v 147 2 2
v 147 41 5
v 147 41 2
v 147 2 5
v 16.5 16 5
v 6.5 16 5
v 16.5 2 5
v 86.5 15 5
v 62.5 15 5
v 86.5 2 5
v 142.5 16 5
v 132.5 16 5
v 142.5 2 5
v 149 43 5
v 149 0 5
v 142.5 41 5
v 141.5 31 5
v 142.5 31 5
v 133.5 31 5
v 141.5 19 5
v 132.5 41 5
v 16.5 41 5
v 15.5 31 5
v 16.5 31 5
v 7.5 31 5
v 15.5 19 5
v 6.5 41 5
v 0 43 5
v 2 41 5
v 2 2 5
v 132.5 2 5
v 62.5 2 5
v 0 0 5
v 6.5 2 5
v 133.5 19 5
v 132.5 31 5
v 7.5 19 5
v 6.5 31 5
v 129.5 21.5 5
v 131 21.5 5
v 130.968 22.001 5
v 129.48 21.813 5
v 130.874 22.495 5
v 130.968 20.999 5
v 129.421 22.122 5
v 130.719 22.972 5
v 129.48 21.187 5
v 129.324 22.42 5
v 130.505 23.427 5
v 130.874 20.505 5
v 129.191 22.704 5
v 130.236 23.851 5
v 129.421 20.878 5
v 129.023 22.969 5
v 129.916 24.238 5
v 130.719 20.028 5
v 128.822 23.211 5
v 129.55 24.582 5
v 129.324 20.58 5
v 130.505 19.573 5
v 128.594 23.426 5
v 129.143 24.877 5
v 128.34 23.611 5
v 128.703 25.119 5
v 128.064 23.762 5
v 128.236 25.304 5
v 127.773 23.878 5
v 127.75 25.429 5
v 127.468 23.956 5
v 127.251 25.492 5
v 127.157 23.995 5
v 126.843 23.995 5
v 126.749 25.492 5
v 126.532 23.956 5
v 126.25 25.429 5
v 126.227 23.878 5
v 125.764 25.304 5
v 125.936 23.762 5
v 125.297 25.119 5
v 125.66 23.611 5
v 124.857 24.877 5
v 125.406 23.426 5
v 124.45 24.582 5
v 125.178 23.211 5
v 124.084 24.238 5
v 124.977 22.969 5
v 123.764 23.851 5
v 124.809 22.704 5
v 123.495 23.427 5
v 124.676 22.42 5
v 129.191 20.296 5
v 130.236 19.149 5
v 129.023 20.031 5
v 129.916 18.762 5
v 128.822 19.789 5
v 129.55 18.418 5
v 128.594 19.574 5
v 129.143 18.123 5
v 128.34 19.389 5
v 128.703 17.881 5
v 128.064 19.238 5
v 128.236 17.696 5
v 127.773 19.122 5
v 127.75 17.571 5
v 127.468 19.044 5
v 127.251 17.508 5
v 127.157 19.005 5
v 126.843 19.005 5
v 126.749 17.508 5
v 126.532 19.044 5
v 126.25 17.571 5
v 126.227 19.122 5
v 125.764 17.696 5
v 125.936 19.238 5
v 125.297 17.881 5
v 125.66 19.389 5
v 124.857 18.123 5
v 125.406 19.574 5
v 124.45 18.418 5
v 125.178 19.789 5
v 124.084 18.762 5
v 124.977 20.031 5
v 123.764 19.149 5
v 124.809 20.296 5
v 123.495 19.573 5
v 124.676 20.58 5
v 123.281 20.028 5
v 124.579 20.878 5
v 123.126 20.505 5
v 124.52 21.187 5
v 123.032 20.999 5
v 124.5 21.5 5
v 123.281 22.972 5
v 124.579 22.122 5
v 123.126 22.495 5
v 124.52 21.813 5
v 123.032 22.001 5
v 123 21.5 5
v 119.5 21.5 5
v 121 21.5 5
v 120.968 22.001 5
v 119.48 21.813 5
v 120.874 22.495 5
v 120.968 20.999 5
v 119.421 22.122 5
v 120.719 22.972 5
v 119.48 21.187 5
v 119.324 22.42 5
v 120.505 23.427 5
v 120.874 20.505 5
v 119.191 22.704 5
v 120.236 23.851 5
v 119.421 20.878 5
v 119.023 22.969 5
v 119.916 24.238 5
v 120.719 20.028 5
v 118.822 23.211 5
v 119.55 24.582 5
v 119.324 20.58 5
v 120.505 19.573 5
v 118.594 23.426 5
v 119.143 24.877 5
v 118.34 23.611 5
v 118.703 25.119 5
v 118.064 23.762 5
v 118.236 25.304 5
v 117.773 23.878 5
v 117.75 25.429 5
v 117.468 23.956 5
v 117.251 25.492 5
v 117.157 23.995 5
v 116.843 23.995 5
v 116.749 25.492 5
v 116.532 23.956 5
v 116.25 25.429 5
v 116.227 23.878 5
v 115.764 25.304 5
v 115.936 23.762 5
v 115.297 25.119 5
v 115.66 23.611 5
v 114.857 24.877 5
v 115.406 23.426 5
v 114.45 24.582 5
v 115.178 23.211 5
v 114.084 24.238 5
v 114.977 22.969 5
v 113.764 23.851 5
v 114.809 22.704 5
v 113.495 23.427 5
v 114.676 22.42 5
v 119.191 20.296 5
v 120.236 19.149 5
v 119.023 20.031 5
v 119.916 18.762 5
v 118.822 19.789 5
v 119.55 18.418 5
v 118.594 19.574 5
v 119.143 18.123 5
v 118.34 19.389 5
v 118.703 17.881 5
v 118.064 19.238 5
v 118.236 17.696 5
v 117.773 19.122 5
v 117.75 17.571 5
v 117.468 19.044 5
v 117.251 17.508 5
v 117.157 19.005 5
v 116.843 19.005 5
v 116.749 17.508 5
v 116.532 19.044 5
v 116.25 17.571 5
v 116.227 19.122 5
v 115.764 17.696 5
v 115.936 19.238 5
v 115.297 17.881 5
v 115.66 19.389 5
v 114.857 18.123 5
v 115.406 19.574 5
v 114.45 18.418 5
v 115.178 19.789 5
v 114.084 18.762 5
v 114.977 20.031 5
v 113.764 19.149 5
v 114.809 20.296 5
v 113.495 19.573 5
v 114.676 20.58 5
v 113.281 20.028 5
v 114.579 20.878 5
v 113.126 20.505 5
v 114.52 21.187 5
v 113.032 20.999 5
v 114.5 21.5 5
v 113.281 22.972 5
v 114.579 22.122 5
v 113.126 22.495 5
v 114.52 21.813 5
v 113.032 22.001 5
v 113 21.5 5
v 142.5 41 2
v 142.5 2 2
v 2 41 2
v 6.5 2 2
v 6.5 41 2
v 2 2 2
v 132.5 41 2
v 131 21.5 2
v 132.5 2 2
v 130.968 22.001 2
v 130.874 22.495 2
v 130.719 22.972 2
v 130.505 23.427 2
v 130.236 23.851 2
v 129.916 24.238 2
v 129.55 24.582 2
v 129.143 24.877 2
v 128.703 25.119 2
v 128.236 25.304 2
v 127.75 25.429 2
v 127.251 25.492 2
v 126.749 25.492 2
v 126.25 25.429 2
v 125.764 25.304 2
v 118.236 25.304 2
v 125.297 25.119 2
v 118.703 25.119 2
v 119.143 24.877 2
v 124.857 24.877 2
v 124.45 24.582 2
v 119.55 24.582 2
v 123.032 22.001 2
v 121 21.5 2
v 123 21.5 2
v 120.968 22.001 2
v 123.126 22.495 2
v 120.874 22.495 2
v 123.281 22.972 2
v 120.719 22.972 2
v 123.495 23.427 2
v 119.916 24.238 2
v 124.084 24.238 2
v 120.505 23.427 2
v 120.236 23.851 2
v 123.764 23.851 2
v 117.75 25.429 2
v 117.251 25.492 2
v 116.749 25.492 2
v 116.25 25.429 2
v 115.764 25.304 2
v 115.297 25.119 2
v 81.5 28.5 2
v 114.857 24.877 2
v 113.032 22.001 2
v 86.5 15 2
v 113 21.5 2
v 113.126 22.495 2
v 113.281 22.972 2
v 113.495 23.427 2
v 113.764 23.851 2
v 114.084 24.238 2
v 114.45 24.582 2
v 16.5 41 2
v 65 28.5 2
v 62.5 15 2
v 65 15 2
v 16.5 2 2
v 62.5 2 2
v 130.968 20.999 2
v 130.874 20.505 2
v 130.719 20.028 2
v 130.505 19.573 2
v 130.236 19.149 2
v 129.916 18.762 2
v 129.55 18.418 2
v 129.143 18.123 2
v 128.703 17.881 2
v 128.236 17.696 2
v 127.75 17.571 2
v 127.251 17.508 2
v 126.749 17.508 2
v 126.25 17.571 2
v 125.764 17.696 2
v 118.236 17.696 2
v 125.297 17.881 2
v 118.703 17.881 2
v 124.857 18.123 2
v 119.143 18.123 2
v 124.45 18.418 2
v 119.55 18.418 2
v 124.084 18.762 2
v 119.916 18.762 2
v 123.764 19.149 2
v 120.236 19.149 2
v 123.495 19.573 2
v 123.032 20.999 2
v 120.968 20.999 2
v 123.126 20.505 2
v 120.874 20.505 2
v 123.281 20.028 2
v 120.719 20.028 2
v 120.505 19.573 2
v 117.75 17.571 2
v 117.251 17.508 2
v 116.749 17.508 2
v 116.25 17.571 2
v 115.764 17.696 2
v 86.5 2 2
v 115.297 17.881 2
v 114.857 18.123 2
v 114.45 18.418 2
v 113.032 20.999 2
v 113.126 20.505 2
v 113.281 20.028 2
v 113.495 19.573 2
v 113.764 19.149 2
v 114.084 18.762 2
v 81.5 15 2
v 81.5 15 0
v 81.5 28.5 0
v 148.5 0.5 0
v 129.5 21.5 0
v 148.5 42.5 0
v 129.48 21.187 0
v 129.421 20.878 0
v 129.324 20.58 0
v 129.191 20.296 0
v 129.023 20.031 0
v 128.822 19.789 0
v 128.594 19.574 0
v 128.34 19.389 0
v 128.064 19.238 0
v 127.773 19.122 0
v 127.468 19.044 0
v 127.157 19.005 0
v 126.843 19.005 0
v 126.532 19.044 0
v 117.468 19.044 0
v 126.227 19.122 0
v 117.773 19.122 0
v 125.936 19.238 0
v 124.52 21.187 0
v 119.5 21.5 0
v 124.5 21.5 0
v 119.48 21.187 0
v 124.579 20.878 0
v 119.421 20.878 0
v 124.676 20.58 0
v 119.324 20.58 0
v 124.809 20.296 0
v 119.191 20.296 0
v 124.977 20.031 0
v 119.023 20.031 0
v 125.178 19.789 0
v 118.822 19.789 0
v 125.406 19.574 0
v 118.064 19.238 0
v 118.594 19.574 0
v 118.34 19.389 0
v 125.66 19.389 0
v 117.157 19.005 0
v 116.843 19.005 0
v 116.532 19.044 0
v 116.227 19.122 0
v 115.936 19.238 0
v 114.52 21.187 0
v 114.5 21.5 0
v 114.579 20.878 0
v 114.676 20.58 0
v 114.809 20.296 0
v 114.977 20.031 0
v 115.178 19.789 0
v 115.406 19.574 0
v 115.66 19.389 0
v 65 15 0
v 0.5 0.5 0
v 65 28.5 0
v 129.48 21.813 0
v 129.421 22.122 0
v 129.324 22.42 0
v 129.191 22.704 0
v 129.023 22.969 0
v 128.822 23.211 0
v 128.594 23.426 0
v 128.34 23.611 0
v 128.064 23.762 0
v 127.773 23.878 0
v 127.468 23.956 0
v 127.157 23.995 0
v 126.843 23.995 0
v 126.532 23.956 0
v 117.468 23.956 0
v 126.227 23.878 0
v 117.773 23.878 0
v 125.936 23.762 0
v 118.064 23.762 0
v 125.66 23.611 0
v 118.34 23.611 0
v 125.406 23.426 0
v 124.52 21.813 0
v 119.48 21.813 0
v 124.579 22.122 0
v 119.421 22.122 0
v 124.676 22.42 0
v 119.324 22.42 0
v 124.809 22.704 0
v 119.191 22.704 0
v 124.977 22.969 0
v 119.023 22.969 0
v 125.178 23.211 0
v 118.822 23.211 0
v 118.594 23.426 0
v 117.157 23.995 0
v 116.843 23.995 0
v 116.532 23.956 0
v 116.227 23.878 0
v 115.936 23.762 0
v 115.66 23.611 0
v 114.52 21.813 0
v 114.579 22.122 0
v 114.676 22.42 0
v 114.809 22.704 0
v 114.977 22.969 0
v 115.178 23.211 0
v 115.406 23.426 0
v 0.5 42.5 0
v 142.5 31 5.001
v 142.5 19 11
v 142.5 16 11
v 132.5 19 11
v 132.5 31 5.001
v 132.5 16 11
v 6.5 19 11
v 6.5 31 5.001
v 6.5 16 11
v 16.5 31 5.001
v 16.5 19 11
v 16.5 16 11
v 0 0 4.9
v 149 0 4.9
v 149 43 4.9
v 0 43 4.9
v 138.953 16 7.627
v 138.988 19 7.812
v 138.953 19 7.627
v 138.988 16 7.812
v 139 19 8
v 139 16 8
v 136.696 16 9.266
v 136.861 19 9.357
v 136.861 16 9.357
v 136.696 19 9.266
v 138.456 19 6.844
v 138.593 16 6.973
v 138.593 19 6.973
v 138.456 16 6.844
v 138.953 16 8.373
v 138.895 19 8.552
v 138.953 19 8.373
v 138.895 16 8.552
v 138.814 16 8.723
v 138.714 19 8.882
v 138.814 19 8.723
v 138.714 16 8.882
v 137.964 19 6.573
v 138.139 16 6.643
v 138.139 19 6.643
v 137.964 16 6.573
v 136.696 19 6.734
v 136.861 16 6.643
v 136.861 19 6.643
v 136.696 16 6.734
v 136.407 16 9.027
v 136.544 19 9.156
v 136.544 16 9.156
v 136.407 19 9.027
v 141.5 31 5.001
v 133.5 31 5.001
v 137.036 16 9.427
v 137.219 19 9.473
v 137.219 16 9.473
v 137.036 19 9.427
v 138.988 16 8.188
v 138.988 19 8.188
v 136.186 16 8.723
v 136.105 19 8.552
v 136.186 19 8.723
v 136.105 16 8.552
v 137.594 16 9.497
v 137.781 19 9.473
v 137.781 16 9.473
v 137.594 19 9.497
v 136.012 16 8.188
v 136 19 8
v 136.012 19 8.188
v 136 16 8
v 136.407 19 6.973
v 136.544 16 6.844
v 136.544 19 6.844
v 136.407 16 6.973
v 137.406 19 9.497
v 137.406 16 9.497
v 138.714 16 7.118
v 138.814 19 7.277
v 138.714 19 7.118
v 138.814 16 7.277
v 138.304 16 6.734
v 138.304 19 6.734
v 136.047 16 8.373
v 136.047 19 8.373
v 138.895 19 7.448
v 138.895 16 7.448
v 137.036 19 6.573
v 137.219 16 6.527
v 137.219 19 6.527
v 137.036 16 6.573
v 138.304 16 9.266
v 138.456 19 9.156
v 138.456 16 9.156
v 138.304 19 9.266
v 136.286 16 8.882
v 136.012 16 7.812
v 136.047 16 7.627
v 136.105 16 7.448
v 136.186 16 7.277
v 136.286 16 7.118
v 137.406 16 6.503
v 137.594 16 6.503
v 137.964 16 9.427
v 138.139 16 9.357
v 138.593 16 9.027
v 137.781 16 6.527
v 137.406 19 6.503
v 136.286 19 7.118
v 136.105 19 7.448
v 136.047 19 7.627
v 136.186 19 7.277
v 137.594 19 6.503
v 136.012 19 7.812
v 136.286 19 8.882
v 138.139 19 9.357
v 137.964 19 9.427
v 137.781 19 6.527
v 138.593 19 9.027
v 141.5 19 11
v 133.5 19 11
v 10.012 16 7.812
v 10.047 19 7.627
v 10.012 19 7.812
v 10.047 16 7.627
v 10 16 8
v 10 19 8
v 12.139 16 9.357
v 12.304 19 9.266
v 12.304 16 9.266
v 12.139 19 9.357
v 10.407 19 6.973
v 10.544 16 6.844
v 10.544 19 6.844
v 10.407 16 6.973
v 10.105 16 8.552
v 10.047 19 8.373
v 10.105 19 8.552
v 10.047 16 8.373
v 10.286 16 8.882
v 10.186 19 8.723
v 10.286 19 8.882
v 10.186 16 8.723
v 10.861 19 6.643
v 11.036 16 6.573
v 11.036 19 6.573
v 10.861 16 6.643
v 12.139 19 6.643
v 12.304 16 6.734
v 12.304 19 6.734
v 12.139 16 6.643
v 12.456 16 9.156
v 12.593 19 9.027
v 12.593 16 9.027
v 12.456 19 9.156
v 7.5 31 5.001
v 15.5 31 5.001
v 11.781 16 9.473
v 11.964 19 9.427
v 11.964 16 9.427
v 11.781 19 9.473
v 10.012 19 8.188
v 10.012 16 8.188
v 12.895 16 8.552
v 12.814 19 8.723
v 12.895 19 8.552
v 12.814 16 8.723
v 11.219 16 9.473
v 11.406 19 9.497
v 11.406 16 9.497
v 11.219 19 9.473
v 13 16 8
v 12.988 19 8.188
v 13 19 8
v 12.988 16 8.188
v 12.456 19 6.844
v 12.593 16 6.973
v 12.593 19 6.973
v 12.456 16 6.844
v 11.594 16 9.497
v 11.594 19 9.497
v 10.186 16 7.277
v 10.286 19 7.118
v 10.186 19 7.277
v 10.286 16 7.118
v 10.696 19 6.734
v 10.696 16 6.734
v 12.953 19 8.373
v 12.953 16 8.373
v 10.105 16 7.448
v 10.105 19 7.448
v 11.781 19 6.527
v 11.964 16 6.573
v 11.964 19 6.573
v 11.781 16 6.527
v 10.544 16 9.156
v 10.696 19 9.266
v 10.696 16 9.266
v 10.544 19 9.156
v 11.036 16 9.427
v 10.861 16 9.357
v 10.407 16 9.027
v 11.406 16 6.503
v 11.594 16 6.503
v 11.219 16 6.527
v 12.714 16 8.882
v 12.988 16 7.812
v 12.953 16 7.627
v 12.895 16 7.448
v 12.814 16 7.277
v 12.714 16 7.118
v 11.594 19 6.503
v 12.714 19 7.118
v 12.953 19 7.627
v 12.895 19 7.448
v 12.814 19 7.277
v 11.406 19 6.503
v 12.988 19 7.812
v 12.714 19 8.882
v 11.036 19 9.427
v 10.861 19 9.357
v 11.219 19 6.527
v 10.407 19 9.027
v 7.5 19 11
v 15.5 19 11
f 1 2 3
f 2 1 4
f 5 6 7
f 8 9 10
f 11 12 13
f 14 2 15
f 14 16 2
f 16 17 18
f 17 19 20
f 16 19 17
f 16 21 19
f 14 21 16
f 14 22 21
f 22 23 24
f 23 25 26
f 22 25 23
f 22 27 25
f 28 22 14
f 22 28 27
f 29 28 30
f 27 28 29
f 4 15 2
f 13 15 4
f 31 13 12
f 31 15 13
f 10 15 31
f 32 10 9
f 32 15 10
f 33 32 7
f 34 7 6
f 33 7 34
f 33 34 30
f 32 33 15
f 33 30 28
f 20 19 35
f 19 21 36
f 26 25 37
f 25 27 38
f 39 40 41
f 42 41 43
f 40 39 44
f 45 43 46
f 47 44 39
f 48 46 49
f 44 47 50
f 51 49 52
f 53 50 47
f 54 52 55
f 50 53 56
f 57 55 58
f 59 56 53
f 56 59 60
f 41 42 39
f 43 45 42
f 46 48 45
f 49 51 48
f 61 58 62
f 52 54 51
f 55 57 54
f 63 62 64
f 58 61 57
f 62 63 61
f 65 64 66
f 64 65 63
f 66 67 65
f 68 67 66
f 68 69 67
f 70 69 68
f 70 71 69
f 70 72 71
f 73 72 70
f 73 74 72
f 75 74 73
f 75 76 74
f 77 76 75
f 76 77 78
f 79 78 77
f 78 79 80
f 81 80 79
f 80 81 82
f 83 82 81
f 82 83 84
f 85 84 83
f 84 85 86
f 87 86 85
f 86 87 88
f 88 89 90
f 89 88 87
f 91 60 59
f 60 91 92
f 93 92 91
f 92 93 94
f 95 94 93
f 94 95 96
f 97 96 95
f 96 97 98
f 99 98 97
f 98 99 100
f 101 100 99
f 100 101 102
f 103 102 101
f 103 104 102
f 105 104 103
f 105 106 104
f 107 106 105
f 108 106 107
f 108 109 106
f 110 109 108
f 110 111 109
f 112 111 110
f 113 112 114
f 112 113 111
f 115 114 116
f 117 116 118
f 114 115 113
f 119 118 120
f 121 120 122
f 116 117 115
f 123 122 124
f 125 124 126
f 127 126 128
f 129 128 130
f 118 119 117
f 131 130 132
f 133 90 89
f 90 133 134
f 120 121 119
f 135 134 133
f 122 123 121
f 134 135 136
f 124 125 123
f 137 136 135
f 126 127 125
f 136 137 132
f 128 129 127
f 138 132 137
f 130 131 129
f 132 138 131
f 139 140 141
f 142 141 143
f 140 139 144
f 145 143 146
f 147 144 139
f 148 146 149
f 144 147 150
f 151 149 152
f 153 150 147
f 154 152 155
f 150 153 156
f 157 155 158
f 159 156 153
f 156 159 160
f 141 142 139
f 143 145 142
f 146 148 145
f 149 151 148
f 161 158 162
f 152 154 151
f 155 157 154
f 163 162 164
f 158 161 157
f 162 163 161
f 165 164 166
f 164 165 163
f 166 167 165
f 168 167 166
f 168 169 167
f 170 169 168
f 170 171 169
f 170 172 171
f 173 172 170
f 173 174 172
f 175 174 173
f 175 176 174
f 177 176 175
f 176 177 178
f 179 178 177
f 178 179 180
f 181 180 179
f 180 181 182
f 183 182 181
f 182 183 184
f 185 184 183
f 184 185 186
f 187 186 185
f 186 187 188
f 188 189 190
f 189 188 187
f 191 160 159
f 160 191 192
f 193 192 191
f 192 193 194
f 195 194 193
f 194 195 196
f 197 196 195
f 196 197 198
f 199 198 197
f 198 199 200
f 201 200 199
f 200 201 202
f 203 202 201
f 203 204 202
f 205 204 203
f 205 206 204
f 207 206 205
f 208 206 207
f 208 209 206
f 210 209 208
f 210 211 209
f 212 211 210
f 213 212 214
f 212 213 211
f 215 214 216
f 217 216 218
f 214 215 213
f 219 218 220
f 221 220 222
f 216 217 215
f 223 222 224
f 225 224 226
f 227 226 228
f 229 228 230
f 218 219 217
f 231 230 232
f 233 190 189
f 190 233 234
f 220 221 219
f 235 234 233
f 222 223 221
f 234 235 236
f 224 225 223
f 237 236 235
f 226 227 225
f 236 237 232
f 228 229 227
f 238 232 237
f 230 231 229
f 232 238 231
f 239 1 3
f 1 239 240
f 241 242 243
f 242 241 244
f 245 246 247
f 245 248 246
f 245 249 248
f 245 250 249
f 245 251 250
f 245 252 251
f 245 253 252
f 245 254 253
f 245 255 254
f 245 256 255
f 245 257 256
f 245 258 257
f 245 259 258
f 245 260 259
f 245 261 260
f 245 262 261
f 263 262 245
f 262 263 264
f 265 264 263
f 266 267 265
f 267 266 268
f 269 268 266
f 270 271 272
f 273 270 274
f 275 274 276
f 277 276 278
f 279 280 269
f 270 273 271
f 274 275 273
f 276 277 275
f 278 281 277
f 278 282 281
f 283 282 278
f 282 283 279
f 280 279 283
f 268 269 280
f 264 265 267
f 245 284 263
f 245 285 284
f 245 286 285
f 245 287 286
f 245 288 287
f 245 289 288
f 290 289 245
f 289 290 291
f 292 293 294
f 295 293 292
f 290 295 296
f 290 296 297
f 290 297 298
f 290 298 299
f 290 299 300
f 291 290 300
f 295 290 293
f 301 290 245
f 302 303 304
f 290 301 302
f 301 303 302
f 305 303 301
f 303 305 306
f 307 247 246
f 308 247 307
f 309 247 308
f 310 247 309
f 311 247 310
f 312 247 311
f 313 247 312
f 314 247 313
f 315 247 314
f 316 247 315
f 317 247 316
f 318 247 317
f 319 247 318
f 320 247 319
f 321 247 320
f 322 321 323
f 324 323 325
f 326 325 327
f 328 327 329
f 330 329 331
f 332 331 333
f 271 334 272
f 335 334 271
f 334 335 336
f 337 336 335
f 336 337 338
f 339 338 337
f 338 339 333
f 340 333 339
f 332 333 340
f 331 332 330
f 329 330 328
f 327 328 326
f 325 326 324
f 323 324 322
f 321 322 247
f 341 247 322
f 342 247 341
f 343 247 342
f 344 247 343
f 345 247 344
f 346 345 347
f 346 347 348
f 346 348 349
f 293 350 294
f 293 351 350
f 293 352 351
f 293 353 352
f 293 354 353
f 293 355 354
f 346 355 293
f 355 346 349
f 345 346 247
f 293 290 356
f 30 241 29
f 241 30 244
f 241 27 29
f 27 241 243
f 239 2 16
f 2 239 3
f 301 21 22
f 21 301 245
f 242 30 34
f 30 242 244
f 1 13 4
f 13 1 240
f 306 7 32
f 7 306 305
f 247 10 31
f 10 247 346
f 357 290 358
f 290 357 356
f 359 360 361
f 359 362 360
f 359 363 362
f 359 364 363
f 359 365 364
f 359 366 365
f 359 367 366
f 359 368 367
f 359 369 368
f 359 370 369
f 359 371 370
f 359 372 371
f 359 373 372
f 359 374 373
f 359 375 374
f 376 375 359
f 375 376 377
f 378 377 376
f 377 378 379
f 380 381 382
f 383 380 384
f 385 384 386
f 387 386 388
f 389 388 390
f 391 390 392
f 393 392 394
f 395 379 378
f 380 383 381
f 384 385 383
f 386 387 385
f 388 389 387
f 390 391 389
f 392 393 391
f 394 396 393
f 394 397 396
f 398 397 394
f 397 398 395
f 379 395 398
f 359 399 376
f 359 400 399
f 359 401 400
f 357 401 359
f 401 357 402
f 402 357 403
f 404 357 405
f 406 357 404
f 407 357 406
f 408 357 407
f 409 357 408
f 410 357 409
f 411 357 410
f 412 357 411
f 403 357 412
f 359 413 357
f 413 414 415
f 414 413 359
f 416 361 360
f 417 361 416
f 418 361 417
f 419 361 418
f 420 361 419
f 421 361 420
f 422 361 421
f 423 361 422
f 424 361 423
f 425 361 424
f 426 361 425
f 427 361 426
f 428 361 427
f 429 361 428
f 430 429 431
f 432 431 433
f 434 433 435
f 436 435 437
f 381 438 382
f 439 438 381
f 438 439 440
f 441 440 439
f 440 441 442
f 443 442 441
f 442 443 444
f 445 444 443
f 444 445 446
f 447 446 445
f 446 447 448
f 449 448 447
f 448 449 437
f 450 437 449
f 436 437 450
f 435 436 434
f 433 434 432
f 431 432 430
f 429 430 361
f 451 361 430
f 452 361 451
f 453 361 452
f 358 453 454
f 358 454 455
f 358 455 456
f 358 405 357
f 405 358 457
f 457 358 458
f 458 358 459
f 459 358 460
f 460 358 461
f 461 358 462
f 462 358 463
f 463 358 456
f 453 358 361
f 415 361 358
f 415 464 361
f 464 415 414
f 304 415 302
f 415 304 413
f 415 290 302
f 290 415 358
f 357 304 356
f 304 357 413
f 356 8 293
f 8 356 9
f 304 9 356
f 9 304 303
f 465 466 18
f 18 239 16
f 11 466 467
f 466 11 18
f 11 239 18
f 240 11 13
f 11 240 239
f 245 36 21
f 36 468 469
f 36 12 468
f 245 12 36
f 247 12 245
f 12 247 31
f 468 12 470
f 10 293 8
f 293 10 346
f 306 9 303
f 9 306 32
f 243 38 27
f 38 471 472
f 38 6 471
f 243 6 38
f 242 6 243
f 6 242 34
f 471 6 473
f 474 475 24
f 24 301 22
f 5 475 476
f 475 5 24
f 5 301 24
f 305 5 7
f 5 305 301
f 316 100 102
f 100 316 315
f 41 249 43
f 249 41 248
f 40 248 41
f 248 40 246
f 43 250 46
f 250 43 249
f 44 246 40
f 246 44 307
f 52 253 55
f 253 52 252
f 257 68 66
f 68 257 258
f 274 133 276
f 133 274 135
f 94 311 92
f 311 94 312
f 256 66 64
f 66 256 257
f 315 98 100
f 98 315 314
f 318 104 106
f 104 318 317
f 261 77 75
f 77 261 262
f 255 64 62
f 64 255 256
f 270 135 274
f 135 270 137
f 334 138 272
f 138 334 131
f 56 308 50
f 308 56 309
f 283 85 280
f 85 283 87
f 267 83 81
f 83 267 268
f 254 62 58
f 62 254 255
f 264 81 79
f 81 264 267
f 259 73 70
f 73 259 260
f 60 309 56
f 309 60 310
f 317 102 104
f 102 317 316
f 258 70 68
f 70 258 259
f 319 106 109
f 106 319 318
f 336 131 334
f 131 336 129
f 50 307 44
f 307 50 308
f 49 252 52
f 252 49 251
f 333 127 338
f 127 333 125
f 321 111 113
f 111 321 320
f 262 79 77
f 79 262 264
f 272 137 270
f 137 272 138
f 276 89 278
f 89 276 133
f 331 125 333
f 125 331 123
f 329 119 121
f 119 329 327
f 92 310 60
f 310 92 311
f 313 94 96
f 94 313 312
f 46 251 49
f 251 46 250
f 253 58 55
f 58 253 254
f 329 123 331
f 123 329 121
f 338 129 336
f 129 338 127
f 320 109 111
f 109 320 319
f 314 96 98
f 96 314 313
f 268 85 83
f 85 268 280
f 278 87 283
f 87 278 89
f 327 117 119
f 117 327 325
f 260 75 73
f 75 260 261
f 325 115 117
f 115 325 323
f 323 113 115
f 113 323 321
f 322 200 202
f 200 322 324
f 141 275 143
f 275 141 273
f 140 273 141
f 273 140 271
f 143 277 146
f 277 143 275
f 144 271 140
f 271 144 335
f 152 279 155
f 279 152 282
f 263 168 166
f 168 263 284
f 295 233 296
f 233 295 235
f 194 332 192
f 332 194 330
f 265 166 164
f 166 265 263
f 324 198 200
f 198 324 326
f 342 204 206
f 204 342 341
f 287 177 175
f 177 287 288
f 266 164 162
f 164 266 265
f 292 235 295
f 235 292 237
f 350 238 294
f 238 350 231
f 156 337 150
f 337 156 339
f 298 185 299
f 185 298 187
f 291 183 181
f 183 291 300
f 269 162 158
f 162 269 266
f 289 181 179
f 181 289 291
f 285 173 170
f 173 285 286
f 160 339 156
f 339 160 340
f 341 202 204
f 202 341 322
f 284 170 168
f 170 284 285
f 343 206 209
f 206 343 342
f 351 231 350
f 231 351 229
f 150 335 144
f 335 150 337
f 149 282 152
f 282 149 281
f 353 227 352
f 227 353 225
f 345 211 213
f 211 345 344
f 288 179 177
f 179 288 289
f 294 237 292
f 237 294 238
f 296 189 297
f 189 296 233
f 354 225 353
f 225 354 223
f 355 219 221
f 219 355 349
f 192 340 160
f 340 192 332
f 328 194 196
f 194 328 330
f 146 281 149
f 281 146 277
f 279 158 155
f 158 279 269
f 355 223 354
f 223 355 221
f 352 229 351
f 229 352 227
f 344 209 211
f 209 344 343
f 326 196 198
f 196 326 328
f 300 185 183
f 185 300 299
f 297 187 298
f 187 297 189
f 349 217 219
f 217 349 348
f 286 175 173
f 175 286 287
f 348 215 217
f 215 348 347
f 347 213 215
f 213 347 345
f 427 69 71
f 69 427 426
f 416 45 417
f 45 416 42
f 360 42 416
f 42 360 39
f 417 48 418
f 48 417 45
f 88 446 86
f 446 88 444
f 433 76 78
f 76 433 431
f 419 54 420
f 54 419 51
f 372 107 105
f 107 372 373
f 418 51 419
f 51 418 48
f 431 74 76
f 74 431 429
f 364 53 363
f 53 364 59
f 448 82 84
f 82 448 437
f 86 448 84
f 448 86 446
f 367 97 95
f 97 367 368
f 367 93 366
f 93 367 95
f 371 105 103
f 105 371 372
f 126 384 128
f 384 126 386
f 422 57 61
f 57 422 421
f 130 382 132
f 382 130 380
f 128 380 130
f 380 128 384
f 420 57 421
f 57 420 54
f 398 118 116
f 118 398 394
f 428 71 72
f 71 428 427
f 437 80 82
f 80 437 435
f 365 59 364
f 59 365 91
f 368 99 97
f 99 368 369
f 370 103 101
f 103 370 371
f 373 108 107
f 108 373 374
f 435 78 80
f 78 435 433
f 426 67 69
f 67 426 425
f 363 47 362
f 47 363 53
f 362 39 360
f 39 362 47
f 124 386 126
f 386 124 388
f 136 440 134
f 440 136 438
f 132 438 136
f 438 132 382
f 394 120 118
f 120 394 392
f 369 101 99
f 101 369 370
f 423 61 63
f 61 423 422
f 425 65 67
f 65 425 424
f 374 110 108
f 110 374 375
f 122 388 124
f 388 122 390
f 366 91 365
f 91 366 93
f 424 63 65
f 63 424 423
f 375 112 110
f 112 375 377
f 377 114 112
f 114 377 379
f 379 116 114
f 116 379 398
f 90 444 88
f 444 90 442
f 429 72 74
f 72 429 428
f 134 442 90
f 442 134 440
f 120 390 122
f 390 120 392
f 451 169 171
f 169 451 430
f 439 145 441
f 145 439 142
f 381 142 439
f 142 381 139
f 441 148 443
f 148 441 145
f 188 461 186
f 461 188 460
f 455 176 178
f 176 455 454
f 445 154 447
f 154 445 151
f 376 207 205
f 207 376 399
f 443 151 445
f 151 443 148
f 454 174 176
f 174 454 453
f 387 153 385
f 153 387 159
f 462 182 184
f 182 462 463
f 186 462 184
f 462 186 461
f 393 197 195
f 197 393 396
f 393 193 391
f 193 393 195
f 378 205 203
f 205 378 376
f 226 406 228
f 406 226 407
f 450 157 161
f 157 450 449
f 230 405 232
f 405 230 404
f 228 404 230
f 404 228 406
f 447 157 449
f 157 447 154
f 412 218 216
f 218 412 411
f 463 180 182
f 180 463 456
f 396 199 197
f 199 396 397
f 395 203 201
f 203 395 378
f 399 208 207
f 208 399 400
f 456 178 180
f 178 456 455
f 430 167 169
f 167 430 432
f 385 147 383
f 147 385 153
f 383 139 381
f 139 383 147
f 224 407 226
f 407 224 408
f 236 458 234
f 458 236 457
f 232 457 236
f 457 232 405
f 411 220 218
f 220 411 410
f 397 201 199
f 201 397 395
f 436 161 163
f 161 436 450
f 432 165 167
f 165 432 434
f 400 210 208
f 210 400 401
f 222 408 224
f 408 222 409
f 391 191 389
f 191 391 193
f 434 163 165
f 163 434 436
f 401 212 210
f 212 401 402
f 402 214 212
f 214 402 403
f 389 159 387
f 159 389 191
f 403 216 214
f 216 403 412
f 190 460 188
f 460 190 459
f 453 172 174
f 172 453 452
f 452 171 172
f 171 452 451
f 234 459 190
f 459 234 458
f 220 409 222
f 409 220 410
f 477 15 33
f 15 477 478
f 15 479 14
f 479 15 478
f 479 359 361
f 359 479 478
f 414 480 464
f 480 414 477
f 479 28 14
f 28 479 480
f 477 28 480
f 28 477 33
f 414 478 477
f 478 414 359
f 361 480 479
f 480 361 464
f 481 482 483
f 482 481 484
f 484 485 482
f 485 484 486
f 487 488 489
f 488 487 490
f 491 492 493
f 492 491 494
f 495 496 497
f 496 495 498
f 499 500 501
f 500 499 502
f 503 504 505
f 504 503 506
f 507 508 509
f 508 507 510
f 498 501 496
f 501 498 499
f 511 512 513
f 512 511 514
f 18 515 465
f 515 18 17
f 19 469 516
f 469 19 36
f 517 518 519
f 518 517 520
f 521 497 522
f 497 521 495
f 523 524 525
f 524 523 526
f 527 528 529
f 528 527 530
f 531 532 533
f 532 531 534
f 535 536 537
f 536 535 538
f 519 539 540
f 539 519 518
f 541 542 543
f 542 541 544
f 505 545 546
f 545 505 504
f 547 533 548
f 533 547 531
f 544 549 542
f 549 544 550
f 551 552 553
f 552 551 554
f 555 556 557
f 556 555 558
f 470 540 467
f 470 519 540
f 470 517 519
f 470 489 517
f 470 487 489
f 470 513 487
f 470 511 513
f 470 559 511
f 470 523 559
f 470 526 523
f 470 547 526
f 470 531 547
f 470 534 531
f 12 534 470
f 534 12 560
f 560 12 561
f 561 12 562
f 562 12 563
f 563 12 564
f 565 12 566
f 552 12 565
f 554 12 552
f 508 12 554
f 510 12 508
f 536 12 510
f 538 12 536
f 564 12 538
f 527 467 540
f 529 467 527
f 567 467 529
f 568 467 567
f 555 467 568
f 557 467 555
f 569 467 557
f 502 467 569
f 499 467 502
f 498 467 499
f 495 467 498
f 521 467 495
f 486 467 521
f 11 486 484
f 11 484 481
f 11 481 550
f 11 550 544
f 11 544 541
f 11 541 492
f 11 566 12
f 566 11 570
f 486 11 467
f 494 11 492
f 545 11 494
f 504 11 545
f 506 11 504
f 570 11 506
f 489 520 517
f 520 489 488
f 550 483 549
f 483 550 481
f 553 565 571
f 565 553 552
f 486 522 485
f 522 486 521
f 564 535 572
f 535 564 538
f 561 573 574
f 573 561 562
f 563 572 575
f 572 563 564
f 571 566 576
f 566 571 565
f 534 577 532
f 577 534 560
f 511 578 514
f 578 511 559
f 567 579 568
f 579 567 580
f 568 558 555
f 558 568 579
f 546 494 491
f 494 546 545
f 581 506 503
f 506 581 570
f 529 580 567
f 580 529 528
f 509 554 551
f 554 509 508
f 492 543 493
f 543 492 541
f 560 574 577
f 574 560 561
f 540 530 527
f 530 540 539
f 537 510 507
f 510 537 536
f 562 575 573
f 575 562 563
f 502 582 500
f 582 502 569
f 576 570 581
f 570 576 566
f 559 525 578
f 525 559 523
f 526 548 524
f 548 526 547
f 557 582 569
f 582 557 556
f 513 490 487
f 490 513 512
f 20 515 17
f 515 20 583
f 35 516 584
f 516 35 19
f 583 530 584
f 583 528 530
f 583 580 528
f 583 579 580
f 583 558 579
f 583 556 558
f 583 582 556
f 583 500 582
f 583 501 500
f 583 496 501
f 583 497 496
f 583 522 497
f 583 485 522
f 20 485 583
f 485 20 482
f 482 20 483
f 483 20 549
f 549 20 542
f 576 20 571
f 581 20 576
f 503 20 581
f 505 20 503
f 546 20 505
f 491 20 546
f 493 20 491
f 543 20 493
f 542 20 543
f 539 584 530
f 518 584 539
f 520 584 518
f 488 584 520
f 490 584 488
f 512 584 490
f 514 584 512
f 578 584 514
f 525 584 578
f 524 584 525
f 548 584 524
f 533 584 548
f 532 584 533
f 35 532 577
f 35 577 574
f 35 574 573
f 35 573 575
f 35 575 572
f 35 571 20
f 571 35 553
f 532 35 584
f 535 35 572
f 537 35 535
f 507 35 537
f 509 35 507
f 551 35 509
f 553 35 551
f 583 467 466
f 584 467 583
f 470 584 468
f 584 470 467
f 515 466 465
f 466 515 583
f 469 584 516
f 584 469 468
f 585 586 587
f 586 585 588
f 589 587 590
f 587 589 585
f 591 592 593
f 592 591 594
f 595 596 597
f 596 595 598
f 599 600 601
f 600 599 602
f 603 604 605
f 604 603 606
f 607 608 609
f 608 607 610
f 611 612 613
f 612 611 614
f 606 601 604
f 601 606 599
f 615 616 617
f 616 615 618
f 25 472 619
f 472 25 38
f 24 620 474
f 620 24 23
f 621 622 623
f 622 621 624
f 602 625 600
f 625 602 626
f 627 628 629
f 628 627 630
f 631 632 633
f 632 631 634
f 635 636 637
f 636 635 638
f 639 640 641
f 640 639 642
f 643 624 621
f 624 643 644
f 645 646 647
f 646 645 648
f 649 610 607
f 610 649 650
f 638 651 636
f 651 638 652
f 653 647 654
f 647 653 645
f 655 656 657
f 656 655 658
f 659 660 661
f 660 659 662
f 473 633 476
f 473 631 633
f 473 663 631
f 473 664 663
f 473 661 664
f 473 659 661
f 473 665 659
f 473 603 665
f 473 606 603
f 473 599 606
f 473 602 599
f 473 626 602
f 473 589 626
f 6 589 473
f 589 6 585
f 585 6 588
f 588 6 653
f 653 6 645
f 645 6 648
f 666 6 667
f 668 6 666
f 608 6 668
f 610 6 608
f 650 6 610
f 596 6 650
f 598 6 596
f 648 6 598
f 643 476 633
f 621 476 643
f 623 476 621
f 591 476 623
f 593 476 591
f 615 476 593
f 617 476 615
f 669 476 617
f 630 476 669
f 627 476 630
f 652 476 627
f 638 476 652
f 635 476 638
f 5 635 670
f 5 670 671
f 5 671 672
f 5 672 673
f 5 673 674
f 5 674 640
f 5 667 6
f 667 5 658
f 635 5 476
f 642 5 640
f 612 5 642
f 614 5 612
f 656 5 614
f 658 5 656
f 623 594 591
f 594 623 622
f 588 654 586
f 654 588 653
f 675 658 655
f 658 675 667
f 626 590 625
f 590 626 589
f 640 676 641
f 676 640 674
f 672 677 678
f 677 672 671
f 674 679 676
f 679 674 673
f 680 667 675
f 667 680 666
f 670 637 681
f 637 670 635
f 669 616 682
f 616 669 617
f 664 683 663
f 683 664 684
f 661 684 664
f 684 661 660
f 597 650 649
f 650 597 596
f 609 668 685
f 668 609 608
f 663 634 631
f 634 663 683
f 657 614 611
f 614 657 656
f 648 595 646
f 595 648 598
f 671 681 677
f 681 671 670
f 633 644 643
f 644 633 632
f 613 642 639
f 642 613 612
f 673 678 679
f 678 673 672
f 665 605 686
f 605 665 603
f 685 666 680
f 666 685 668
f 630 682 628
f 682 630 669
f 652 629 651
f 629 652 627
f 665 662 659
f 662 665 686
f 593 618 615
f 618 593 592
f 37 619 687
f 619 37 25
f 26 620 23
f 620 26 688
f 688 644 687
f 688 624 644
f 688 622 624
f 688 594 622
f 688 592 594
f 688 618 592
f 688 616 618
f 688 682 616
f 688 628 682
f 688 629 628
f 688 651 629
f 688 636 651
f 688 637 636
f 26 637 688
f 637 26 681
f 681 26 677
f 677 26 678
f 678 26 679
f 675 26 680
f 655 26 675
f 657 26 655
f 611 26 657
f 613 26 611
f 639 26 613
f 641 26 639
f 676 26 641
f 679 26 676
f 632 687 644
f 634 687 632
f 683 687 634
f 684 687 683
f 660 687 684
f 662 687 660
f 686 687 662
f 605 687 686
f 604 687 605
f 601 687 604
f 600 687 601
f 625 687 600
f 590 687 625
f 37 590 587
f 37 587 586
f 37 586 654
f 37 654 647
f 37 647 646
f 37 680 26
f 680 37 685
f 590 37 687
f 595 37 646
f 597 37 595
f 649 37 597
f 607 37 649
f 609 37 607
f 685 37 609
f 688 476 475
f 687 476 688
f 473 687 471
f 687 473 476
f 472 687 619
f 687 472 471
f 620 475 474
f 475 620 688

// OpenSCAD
// Alternative 5.25" half height mount for DECromancer's MFM Emulator
// By Hans Christian Saustrup <hc@saustrup.net>
model_version = "v0.1.0";

// $fn = $preview ? 0 : 25;
$fn = $preview ? 0 : 50;

front = [149, 43, 5];

mount_x = 126; // spacing
mount_y = 3; // distance from edge of front
mount_z = 16; // height of bar

screw_r = 3/2;

t = 2;
cutout = [
    front.x-(2*t),
    front.y-(2*t),
    front.z-t
];

screwmount = [10, 15, 6];

ethernet_cutout = [16.5, 13.5, front.z];
ethernet_pos = [65, 15, 0];

led_distance = 10;
led_offset = 22;

difference() {
    union() {
        hull() {
            h = 0.1;
            c = 0.5; 
            translate([c, c])
            cube([front.x-(c*2), front.y-(c*2), h]);
            translate([0,0,front.z-h])
            cube([front.x, front.y, h]);
        }
    }
    union() {
        difference() {
            // Cut this away
            union() {

                // Hollow out front
                translate([
                    (front.x-cutout.x)/2,
                    (front.y-cutout.y)/2,
                    t,
                ]) cube(cutout);

                // Ethernet cutout
                translate(ethernet_pos)
                cube(ethernet_cutout);
            }

            // Except this:
            union() {
                translate([front.x/2,0,0])
                for (s=[0,1]) mirror([s,0,0]) {
                    // Mount supports
                    translate([(mount_x - screwmount.x)/2, 0, 0])
                    cube([screwmount.x,front.y,front.z]);

                    // Ethernet support plate
                    w = 24;
                    h = ethernet_pos.y;
                    translate([(0 - w)/2, 0, 0])
                    cube([w,h,front.z]);
                }

                // LED mounts
                for (l=[0:1]) {
                    translate([front.x - (led_offset + (led_distance*l)), front.y/2])
                    cylinder(r=4, h=front.z);
                }
            }
        }

        // LEDs
        for (l=[0:1]) {
            translate([front.x - (led_offset + (led_distance*l)), front.y/2])
            cylinder(r=2.5, h=front.z);
        }
    }
}

// Screw mounts
mount_t = 3;
mount_wall_t = 1;
translate([front.x/2, mount_z, front.z])
for (s=[0,1]) mirror([s, 0, 0])
translate([mount_x/2,0])
difference() {
    union() {
        translate([-screwmount.x/2, 0, 0]) {
            hull() {
                cube([screwmount.x, mount_t, screwmount.z]);
                cube([screwmount.x, screwmount.y, 0.001]);
            }
        }
        
    }
    union() {
        translate([0, 0, mount_y])
            rotate([-90,0,0])
                cylinder(r=screw_r, h=screwmount.y);
        translate([(-screwmount.x/2)+mount_wall_t, mount_t, 0])
            cube([
                screwmount.x - (2 * mount_wall_t),
                screwmount.y- (mount_t),
                screwmount.z
            ]);
    }
}
